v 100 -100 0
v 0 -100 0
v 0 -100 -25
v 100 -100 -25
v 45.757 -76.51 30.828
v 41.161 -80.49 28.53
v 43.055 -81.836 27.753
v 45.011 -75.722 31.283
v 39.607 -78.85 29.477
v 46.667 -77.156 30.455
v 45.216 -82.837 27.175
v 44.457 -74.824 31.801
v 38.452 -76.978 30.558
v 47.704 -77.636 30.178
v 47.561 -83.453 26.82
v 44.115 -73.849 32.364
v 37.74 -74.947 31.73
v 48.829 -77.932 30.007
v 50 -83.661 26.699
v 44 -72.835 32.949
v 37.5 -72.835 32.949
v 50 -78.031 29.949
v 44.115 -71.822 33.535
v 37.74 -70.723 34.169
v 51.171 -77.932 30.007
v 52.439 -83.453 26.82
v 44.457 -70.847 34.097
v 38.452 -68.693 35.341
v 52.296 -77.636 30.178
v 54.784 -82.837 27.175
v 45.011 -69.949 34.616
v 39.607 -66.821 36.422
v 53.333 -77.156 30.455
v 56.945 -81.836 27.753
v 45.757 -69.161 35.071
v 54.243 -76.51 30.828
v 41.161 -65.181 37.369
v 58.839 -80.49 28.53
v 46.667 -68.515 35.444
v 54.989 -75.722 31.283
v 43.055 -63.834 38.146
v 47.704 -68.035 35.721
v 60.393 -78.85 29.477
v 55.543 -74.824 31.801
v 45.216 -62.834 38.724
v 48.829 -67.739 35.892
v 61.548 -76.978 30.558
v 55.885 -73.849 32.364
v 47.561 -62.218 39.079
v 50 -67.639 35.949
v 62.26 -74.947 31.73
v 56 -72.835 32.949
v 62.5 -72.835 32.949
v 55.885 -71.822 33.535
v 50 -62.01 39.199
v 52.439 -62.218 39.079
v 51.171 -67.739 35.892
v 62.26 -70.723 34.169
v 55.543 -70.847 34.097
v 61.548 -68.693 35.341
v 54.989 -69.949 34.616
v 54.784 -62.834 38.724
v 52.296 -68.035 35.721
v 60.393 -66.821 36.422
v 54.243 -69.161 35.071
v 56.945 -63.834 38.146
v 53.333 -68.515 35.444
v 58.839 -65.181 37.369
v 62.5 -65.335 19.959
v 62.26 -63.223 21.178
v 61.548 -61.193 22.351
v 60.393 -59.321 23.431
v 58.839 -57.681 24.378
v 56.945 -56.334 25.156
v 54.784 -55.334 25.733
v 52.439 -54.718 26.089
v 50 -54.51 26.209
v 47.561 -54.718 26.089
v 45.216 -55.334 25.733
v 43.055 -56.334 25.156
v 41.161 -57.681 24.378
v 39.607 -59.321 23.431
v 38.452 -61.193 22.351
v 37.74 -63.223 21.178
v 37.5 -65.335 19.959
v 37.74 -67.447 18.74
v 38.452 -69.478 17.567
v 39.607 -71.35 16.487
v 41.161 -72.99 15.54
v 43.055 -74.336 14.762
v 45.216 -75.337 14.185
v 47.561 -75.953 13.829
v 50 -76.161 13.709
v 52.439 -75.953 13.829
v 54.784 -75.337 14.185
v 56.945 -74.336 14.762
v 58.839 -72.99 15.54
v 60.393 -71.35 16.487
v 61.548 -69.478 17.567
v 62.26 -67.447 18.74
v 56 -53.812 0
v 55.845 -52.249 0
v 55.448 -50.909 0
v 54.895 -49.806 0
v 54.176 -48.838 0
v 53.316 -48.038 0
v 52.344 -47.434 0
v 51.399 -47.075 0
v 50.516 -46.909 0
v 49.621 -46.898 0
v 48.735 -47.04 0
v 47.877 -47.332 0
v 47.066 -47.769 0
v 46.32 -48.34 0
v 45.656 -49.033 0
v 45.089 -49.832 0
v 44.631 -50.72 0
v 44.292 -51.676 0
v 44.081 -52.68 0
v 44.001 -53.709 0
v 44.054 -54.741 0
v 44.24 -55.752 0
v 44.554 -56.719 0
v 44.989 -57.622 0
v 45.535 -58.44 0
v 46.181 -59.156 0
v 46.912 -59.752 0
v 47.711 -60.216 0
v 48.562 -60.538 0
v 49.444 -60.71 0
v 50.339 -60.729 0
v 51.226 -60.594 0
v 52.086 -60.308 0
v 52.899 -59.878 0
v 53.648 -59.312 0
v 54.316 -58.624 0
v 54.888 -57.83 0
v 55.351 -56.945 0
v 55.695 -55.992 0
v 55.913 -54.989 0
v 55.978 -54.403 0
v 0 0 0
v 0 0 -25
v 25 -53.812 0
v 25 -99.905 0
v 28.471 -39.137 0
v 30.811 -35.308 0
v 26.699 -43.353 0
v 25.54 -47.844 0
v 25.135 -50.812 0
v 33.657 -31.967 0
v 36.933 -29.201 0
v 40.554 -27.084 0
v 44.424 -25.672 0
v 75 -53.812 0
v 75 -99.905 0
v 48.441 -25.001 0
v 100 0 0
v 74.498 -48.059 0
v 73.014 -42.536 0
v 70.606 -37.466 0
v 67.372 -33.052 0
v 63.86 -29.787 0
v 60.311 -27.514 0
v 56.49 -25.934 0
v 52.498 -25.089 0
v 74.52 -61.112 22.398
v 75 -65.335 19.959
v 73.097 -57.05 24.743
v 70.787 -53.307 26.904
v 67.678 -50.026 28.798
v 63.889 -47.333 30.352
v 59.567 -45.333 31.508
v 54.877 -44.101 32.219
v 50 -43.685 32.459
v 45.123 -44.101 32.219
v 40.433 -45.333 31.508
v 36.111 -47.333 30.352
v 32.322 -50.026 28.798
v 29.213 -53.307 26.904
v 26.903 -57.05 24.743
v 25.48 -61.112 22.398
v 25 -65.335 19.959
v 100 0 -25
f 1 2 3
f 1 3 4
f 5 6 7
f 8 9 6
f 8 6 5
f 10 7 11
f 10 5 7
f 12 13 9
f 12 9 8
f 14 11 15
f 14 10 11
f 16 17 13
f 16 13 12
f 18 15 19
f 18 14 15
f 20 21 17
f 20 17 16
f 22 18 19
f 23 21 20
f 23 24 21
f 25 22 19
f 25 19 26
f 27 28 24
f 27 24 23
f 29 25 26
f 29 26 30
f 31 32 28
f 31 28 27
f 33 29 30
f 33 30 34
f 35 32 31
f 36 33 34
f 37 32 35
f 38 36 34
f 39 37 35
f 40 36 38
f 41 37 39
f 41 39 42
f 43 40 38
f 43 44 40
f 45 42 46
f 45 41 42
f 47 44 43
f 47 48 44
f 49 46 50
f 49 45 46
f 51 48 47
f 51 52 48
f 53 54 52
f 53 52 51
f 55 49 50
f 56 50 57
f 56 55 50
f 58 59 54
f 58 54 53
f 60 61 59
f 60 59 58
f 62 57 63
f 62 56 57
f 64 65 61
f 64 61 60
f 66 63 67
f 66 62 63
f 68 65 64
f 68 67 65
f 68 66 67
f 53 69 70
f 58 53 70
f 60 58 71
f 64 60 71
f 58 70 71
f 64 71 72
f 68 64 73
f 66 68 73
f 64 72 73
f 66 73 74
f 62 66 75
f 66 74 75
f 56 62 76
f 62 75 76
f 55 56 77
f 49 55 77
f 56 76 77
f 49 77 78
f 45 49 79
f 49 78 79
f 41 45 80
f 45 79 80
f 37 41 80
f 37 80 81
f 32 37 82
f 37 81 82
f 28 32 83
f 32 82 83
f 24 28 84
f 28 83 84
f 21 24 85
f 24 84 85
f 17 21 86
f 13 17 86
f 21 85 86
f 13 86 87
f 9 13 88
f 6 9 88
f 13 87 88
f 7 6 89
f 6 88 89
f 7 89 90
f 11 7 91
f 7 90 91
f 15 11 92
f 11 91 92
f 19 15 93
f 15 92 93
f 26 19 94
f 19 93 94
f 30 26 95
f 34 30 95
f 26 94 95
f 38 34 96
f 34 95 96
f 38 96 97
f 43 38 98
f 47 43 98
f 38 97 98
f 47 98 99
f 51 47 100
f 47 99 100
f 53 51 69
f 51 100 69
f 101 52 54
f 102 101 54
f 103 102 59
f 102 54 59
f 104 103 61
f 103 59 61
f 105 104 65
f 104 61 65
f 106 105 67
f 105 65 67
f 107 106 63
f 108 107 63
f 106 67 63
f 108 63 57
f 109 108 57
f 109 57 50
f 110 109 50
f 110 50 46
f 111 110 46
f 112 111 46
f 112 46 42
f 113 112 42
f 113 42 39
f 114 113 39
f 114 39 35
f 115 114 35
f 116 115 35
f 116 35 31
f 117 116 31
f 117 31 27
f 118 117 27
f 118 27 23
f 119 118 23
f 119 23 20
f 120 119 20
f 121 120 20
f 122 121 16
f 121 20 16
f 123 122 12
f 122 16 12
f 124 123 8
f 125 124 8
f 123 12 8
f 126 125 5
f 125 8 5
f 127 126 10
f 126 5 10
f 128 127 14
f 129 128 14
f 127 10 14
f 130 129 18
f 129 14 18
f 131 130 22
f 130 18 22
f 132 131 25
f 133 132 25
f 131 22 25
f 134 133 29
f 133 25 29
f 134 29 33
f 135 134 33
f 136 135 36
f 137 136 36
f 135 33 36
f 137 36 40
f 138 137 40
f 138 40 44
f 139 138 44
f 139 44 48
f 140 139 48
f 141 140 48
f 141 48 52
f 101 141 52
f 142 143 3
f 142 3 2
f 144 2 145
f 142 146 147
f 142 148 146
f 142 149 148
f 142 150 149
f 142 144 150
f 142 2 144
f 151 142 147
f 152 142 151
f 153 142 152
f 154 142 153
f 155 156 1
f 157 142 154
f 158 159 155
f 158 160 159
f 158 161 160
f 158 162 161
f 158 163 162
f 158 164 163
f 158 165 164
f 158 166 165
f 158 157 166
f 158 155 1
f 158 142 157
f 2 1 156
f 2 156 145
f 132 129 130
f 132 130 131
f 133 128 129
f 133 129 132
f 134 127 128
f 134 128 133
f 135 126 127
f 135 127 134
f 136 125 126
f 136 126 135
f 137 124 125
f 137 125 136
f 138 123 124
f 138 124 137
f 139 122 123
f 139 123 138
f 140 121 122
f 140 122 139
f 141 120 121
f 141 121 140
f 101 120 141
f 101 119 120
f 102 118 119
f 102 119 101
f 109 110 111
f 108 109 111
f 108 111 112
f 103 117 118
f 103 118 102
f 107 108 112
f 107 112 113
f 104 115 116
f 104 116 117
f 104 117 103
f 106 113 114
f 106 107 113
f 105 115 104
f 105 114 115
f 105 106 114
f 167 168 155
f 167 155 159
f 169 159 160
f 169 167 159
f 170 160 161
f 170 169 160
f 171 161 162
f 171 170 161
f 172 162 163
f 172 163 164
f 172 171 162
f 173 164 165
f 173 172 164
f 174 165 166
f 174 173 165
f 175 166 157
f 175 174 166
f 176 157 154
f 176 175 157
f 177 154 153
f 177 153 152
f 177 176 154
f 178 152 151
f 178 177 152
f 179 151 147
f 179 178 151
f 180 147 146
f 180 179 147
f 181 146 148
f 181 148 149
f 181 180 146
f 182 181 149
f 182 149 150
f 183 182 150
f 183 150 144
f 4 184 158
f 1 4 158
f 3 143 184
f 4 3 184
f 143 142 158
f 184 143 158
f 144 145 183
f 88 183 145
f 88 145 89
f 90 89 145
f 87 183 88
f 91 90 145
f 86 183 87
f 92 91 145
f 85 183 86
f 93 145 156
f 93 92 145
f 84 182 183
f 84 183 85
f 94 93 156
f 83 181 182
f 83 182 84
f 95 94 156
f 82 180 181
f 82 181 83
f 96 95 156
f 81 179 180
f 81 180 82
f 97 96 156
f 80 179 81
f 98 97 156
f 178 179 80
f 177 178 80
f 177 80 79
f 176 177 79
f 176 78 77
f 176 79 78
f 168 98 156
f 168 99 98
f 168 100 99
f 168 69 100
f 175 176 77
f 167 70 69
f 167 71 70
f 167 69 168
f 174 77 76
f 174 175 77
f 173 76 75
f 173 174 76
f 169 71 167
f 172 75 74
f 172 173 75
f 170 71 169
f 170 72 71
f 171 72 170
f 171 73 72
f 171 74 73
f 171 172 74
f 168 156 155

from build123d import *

# Parameters (mm, degrees)
F0_W      = 100
F0_H      = 25
F1_DEPTH  = 100
F7_W      = 50
F7_H      = 40
F8_R      = 25
F9_R      = 12.5
F12_DEPTH = 15
F13_R     = 6
F14_REACH = 55.0172779755


with BuildPart() as f1:
    # F0 (on Front) → F1 (new body)
    with BuildSketch(Plane.XZ):
        with Locations((50, -12.5)):
            Rectangle(F0_W, F0_H)
    extrude(amount=F1_DEPTH)

    # F7 (on line) + F8 (on line) → F11 (join, up to the next surface of F1)
    with BuildSketch(Plane(origin=(0, -24.9763522297, 43.2603110496), x_dir=(1, 0, 0), z_dir=(0, -0.5, 0.8660254038))):
        with Locations((50, -66.6025403784)):
            Rectangle(F7_W, F7_H)
    with BuildSketch(Plane(origin=(0, -24.9763522297, 43.2603110496), x_dir=(1, 0, 0), z_dir=(0, -0.5, 0.8660254038))):
        with Locations((50, -46.6025403784)):
            Circle(F8_R)
    extrude(until=Until.NEXT, dir=(0, 0.5, -0.8660254038))

    # F9 (on line) → F12 (join)
    with BuildSketch(Plane(origin=(0, -24.9763522297, 43.2603110496), x_dir=(1, 0, 0), z_dir=(0, -0.5, 0.8660254038))):
        with Locations((50, -46.6025403784)):
            Circle(F9_R)
    extrude(amount=F12_DEPTH)

    f14_end = Plane.XY
    # F13 (on face) → F14 (cut, up to a plane its end follows)
    with BuildSketch(Plane(origin=(0, -32.4763522297, 56.2506921064), x_dir=(1, 0, 0), z_dir=(0, -0.5, 0.8660254038))):
        with Locations((50, -46.6025403784)):
            Circle(F13_R)
    f14_long = extrude(amount=-F14_REACH, mode=Mode.PRIVATE)
    add(split(f14_long, bisect_by=f14_end, keep=Keep.TOP, mode=Mode.PRIVATE), mode=Mode.SUBTRACT)


solid = f1.part
